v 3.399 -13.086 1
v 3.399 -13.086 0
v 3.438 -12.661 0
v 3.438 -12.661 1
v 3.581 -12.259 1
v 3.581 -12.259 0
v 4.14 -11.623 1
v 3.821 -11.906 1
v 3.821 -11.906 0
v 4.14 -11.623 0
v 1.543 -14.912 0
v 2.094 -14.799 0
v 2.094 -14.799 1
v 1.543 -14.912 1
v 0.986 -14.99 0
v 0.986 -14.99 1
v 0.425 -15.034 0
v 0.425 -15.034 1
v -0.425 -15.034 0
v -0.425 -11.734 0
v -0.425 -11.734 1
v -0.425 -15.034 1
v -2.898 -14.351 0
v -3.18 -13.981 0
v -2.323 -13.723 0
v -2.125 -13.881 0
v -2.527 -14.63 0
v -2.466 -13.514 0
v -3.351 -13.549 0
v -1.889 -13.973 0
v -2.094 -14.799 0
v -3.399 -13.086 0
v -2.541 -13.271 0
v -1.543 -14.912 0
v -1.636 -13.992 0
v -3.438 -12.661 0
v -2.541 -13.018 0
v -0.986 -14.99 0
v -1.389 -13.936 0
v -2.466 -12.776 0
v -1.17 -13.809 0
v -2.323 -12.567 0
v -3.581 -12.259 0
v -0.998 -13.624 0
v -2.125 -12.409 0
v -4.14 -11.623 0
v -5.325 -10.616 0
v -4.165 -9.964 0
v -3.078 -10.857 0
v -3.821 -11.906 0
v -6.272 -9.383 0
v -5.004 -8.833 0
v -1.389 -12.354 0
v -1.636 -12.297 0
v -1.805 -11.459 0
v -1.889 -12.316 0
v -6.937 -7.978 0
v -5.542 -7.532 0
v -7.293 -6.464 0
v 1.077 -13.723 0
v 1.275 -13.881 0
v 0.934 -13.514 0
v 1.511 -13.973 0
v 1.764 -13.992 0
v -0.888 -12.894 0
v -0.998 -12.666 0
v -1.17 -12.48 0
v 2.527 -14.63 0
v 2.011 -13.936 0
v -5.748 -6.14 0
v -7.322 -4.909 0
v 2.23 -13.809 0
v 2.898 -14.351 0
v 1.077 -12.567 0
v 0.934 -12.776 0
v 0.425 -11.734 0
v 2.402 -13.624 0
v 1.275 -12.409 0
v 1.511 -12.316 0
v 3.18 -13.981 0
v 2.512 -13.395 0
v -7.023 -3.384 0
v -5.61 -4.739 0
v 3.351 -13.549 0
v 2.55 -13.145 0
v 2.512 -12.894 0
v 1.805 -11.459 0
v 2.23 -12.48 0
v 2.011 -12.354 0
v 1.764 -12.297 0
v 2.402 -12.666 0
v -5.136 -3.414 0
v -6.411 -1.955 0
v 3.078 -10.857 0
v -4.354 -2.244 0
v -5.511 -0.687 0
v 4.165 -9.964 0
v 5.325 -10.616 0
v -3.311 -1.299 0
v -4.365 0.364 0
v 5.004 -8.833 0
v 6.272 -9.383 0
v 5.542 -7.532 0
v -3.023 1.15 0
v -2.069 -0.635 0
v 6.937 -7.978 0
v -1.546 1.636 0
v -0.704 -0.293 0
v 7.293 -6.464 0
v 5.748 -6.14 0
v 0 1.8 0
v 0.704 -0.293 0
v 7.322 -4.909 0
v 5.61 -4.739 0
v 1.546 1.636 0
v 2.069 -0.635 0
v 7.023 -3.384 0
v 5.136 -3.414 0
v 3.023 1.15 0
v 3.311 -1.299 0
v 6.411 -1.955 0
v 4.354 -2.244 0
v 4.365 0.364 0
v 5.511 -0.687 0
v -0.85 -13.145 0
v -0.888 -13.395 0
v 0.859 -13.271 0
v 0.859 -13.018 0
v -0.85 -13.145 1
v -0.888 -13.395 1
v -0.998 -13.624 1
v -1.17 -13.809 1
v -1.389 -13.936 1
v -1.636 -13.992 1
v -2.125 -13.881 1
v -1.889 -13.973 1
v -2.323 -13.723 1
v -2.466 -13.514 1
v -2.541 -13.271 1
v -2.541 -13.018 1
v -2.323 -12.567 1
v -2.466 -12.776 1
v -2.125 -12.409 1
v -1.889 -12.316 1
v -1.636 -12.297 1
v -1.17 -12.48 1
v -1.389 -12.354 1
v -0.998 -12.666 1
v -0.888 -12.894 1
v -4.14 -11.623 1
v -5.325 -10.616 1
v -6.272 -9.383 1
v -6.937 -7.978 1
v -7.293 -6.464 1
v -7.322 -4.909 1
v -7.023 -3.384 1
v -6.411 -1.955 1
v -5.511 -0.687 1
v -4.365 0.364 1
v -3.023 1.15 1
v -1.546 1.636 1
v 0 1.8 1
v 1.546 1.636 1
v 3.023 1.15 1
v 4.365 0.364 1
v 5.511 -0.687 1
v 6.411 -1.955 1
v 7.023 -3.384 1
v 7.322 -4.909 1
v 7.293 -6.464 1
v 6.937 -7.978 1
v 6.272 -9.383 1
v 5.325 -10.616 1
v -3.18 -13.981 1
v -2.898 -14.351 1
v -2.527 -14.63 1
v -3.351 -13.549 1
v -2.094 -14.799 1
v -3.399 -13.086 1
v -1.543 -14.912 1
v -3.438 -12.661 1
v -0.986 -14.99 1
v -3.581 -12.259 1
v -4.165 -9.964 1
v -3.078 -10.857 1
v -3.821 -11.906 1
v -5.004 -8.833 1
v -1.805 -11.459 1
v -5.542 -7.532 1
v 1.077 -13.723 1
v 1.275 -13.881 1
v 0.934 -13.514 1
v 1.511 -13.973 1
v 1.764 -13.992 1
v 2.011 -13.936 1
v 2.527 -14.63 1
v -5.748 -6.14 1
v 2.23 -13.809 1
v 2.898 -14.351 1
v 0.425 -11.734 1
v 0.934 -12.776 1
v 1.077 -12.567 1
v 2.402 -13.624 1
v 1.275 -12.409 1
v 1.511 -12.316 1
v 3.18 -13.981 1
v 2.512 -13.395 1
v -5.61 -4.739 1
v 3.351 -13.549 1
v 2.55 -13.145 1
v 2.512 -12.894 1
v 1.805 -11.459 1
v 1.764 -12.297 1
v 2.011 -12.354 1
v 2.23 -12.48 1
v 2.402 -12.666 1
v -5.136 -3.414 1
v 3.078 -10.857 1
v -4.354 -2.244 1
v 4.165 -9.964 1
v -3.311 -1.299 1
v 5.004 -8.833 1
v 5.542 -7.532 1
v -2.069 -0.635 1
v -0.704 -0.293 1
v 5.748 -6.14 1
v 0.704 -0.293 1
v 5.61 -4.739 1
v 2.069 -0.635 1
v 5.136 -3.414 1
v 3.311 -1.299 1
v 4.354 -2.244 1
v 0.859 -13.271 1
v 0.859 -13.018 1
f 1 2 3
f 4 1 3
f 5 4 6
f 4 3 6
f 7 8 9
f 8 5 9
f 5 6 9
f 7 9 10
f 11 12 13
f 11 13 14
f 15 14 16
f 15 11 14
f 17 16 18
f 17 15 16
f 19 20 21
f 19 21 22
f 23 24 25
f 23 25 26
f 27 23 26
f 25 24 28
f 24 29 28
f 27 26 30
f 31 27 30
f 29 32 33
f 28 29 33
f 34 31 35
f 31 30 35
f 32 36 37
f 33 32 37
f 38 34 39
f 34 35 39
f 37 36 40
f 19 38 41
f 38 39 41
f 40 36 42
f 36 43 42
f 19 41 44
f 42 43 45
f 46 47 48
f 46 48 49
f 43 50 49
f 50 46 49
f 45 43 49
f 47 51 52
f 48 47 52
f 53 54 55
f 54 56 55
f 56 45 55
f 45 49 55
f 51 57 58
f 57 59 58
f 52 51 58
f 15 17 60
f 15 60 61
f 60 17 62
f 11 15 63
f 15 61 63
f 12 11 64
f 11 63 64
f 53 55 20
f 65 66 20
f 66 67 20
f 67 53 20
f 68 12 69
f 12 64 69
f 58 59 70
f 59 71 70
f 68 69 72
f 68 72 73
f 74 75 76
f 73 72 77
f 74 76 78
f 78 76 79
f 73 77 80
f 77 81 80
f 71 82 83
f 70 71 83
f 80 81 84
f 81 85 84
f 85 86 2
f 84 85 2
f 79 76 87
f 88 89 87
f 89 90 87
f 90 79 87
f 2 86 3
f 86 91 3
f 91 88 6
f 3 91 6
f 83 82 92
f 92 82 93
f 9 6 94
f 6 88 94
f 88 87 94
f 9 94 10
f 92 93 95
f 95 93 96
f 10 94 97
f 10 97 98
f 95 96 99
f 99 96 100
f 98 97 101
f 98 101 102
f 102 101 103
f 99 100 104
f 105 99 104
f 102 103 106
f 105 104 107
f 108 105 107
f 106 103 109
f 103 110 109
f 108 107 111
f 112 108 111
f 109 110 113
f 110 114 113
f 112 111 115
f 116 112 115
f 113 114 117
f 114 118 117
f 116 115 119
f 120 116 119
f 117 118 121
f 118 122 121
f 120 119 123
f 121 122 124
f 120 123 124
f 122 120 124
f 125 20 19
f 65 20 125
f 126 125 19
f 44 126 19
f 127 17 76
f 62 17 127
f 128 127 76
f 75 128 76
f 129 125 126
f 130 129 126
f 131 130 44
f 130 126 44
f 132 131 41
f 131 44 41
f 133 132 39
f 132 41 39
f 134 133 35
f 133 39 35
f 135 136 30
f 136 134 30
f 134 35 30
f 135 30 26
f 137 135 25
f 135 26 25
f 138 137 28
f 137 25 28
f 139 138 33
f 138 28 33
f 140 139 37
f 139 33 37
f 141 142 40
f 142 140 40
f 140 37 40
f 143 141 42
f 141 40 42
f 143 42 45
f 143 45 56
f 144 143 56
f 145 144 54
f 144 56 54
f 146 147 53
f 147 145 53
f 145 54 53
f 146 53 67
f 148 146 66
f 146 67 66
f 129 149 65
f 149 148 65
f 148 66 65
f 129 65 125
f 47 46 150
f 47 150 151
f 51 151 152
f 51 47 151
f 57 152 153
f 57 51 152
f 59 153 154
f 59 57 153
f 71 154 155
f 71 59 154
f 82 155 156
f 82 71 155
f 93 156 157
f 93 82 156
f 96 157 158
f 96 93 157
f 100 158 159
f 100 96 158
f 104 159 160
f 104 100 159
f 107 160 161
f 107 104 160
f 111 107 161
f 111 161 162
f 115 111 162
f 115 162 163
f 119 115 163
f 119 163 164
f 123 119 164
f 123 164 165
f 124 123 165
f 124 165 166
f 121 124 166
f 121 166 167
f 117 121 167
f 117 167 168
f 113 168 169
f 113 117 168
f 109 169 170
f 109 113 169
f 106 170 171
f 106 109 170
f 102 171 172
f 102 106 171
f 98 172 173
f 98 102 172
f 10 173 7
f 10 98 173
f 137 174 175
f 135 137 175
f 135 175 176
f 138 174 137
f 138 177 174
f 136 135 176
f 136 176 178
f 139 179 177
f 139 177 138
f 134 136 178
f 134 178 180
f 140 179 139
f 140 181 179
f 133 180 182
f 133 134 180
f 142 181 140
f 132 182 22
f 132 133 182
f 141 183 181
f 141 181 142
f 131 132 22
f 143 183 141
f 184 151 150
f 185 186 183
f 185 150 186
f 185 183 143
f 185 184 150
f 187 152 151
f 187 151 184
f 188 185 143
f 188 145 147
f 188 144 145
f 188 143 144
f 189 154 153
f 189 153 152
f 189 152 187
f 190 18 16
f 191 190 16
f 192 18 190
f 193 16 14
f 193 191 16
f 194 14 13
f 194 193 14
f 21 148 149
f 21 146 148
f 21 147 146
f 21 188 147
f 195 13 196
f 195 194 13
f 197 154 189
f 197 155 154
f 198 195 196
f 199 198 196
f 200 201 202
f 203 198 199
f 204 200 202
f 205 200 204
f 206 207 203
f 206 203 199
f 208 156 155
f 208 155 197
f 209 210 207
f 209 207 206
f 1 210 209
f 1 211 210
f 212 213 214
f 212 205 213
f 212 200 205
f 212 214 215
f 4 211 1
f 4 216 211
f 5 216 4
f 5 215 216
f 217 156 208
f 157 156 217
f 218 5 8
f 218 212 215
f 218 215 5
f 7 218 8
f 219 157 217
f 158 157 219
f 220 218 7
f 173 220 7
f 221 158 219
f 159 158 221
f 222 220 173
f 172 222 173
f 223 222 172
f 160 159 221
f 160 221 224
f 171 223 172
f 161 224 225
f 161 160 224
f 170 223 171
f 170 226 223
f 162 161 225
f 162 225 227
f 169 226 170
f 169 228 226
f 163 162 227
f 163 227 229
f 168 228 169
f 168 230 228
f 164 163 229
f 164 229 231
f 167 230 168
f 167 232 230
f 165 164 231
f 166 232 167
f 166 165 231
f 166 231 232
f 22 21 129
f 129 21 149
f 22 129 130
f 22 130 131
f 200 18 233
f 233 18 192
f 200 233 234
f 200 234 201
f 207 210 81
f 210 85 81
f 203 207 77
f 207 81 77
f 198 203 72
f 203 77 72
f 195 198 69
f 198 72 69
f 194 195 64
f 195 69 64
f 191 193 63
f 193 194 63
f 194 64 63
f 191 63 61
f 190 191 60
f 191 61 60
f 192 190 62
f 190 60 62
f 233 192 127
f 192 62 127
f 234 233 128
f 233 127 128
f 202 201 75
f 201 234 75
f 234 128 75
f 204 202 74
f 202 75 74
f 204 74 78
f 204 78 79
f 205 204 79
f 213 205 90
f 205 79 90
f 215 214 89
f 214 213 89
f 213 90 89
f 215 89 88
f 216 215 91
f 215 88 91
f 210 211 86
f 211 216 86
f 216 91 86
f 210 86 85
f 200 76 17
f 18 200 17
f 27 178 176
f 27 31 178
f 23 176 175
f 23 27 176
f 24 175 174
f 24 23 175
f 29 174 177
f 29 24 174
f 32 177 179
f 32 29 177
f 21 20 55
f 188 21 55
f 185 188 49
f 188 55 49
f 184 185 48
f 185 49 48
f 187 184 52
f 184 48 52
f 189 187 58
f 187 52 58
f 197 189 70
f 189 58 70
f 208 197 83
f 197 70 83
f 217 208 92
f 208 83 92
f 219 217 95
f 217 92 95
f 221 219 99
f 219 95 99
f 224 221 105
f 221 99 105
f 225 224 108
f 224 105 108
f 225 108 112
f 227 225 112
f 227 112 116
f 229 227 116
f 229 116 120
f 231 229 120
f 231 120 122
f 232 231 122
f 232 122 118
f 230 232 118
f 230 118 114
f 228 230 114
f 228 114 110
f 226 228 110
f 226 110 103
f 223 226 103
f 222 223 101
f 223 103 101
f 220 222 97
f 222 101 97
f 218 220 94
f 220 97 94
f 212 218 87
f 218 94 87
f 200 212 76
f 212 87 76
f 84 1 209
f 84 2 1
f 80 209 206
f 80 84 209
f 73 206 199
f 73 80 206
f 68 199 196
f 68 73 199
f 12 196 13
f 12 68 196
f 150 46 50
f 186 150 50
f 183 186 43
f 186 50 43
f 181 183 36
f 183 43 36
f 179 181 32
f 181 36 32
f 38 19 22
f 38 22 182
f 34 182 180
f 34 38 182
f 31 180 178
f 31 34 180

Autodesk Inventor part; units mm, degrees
ref_plane "YZ Plane" through (0, 0, 0) normal (1, 0, 0) x (0, 1, 0)
ref_plane "XZ Plane" through (0, 0, 0) normal (0, 1, 0) x (-1, 0, 0)
sketch "Szkic1" plane through (0, 0, 0) normal (0, 0, 1) x (1, 0, 0)
  line L0 (-6, 0) -> (6, 0) construction
  arc A0 (0.425, -11.7343) -> (-0.425, -11.7343) centre (0, -6) ccw
  line L1 (0, 20.1894) -> (0, -80.5364) projected
  line L2 (-48.09, 0) -> (48.09, 0) projected
  line L3 (-0.425, -11.7343) -> (-0.425, -15.0343)
  line L4 (-0.425, -6.5402) -> (-0.425, -13.29) construction
  line L5 (-2.7947, 1.8) -> (3.6722, 1.8) construction
  arc A1 (4.1403, -11.6229) -> (-4.1403, -11.6229) centre (0, -5.55) ccw
  arc A2 (-2.0935, -14.7986) -> (-0.425, -15.0343) centre (0, -6) ccw
  arc A3 (-3.399, -13.0862) -> (-2.0935, -14.7986) centre (-1.7, -13.1448) ccw
  arc A4 (-3.399, -13.0862) -> (-4.1403, -11.6229) centre (-5.098, -13.0275) ccw
  line L6 (0.425, -11.7343) -> (0.425, -15.0343)
  line L7 (0.425, -6.5402) -> (0.425, -13.29) construction
  arc A5 (0.425, -15.0343) -> (2.0935, -14.7986) centre (0, -6) ccw
  arc A6 (2.0935, -14.7986) -> (3.399, -13.0862) centre (1.7, -13.1448) ccw
  arc A7 (4.1403, -11.6229) -> (3.399, -13.0862) centre (5.098, -13.0275) ccw
  circle A8 centre (-1.7, -13.1448) radius 0.85
  circle A9 centre (1.7, -13.1448) radius 0.85
  dimension "d0" = 11.5
  dimension "d1" = 3.3
  dimension "d6" = 0.425
  dimension "d7" = 1.8
  dimension "d8" = 0.45
  dimension "d9" = 1.7
  dimension "d10" = 1.7
  dimension "d11" = 1.275
  dimension "d12" = 1.7
  dimension "d13" = 1.7
  dimension "d14" = 6
extrude "Bryła" add sketch "Szkic1" along normal blind 1
ref_plane "Work Plane1" through (0, -6, 0) normal (1, 0, 0) x (0, 0, 1)
equation "\"d0\" = ND"
equation "\"d1\" = SRB2"
equation "\"d6\" = 0.25 * SD5"
equation "\"d7\" = SRB1"
equation "\"d8\" = 0.25 * SRB1"
equation "\"d9\" = SD5"
equation "\"d10\" = SD5"
equation "\"d11\" = 0.75 * SD5"
equation "\"d12\" = SD5"
equation "\"d13\" = SD5"
equation "\"d14\" = 0.5 * WD"
equation "\"d2\" = SD"
equation "\"WD\" = WDMIN"
equation "\"SD\" = 1"
equation "\"SRB1\" = 1.8"
equation "\"ND\" = 11.5"
equation "\"SRB2\" = 3.3"
equation "\"SD5\" = 1.7"
equation "\"WDMIN\" = 12"
equation "\"SD3\" = 11"
equation "\"WDMAX\" = 13"
properties part number "DIN 471 - 12 x 1" material "Stal, miękka"
